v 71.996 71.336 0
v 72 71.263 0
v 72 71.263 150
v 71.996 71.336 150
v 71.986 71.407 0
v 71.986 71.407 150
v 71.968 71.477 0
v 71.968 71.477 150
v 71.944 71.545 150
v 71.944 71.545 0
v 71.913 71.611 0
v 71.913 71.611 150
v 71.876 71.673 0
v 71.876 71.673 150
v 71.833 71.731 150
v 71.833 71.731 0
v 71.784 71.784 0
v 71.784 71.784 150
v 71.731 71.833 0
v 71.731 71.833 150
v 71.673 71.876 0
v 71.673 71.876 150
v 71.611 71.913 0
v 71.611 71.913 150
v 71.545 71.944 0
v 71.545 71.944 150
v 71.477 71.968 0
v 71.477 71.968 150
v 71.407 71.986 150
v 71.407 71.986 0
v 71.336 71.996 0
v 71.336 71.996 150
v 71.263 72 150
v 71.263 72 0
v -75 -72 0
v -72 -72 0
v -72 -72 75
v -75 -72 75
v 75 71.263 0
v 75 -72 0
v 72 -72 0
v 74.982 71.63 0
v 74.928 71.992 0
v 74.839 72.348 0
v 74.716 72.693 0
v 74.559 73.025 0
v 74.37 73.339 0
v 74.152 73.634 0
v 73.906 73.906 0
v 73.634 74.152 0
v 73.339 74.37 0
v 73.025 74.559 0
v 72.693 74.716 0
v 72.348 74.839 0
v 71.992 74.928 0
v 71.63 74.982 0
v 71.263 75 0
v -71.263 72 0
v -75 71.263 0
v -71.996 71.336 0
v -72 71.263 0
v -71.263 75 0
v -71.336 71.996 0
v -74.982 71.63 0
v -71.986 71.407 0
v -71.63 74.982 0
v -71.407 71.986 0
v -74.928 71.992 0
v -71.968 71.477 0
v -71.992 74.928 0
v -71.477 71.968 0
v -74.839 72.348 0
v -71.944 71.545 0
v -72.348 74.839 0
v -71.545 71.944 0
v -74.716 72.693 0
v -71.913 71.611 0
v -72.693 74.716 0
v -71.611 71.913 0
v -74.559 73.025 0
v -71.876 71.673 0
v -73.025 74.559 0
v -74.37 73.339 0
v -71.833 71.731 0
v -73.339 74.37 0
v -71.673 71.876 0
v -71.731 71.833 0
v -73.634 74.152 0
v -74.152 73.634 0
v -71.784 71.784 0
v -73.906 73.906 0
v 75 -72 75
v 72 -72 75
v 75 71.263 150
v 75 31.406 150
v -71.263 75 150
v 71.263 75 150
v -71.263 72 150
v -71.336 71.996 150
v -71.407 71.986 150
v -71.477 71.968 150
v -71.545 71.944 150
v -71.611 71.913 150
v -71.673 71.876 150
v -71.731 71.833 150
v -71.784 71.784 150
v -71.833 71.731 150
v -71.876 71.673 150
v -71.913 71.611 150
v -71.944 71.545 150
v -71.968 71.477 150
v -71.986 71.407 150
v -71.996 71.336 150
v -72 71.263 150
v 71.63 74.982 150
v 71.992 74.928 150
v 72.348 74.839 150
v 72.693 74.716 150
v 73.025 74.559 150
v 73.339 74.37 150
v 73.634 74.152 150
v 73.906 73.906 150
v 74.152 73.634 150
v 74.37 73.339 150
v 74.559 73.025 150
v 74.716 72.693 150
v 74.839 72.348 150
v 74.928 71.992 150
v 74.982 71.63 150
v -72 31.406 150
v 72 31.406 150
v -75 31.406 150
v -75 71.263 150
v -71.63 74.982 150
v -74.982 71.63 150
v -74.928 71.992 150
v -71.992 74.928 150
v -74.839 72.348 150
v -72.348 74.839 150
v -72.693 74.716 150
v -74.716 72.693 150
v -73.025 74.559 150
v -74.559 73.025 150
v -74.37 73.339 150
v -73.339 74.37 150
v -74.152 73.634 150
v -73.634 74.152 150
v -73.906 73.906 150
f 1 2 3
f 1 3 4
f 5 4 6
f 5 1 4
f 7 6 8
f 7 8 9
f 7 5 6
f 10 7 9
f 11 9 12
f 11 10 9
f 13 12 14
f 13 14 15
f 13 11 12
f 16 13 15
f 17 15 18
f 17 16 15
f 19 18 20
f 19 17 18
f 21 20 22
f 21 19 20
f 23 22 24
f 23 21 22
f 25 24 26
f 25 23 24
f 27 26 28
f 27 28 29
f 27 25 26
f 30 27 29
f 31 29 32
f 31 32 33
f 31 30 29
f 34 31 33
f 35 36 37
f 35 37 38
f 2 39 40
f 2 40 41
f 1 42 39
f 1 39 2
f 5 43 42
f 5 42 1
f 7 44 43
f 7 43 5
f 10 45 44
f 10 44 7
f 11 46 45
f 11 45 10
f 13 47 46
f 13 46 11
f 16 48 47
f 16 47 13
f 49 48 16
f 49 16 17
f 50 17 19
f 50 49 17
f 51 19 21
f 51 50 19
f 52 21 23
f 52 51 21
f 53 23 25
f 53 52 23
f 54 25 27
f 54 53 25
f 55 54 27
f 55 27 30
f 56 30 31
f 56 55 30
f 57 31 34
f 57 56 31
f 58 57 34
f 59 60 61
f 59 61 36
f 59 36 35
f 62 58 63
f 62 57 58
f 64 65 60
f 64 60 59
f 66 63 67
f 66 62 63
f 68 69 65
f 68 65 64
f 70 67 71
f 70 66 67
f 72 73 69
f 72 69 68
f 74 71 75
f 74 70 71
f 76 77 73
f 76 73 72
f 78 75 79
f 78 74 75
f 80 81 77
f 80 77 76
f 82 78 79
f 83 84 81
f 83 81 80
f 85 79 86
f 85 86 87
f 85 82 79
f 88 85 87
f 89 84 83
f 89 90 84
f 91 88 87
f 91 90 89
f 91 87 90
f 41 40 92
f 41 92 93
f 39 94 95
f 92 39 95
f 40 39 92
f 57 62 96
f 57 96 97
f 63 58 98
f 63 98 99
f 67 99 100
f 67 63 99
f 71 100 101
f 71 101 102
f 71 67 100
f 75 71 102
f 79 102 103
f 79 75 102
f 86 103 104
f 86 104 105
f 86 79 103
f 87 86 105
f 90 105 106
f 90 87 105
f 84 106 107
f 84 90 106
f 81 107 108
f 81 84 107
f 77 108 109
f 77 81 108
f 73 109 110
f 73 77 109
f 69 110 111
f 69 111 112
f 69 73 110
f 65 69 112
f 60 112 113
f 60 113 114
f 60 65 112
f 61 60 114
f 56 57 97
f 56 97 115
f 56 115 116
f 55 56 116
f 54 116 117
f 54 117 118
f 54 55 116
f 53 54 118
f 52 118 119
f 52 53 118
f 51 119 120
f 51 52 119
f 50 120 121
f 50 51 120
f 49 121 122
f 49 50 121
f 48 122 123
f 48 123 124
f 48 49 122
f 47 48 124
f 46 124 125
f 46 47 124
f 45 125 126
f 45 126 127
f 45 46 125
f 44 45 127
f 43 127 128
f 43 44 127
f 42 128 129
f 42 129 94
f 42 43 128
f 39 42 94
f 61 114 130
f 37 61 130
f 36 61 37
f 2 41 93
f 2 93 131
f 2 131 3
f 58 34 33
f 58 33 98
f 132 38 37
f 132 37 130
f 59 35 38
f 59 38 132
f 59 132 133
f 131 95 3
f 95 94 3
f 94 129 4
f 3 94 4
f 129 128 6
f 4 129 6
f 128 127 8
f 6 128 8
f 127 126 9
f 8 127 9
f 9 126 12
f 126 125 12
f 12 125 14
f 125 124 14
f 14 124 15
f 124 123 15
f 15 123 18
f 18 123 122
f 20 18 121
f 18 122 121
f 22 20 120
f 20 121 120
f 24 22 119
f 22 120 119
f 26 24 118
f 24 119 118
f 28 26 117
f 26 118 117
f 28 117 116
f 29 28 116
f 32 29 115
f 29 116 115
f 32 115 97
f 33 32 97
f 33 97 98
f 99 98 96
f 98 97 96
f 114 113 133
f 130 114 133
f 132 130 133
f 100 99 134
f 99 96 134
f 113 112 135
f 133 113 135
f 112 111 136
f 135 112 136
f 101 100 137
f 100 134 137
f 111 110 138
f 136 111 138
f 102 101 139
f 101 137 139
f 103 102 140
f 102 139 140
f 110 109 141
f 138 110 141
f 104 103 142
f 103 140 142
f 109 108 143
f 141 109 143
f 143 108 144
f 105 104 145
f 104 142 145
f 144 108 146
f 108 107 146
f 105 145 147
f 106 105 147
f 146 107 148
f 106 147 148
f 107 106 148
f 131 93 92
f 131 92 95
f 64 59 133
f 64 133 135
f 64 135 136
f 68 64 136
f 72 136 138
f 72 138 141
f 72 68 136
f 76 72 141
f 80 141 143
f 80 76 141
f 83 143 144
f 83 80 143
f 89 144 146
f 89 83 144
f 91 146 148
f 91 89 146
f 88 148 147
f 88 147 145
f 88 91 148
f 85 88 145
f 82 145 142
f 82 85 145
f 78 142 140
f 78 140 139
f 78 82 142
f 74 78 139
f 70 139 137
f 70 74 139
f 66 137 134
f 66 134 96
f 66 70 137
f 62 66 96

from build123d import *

# Parameters (mm, degrees)
BASE_FLANGE1_DEPTH = 150
CUT_EXTRUDE1_DEPTH = 226


# Sheet-metal steps are written as plain solids
with BuildPart() as part:
    # Sketch1 → Base-Flange1 (new body)
    with BuildSketch(Plane.XY):
        with BuildLine():
            Line((72, -72), (72, 71.2634))
            ThreePointArc((72, 71.2634), (71.784254855, 71.784254855), (71.2634, 72))
            Line((71.2634, 72), (-71.2634, 72))
            ThreePointArc((-71.2634, 72), (-71.784254855, 71.784254855), (-72, 71.2634))
            Line((-72, 71.2634), (-72, -72))
            Line((-72, -72), (-75, -72))
            Line((-75, -72), (-75, 71.2634))
            ThreePointArc((-75, 71.2634), (-73.905575199, 73.905575199), (-71.2634, 75))
            Line((-71.2634, 75), (71.2634, 75))
            ThreePointArc((71.2634, 75), (73.905575199, 73.905575199), (75, 71.2634))
            Line((75, 71.2634), (75, -72))
            Line((75, -72), (72, -72))
        make_face()
    extrude(amount=BASE_FLANGE1_DEPTH)

    # Sketch6 → Cut-Extrude1 (cut, through all)
    with BuildSketch(Plane.ZY.offset(75)):
        Polygon((75, -72), (150, 31.405620606), (170.305781078, 31.405620606), (170.305781078, -96.262552323), (75, -96.262552323), align=None)
    extrude(amount=-CUT_EXTRUDE1_DEPTH, mode=Mode.SUBTRACT)


solid = part.part
